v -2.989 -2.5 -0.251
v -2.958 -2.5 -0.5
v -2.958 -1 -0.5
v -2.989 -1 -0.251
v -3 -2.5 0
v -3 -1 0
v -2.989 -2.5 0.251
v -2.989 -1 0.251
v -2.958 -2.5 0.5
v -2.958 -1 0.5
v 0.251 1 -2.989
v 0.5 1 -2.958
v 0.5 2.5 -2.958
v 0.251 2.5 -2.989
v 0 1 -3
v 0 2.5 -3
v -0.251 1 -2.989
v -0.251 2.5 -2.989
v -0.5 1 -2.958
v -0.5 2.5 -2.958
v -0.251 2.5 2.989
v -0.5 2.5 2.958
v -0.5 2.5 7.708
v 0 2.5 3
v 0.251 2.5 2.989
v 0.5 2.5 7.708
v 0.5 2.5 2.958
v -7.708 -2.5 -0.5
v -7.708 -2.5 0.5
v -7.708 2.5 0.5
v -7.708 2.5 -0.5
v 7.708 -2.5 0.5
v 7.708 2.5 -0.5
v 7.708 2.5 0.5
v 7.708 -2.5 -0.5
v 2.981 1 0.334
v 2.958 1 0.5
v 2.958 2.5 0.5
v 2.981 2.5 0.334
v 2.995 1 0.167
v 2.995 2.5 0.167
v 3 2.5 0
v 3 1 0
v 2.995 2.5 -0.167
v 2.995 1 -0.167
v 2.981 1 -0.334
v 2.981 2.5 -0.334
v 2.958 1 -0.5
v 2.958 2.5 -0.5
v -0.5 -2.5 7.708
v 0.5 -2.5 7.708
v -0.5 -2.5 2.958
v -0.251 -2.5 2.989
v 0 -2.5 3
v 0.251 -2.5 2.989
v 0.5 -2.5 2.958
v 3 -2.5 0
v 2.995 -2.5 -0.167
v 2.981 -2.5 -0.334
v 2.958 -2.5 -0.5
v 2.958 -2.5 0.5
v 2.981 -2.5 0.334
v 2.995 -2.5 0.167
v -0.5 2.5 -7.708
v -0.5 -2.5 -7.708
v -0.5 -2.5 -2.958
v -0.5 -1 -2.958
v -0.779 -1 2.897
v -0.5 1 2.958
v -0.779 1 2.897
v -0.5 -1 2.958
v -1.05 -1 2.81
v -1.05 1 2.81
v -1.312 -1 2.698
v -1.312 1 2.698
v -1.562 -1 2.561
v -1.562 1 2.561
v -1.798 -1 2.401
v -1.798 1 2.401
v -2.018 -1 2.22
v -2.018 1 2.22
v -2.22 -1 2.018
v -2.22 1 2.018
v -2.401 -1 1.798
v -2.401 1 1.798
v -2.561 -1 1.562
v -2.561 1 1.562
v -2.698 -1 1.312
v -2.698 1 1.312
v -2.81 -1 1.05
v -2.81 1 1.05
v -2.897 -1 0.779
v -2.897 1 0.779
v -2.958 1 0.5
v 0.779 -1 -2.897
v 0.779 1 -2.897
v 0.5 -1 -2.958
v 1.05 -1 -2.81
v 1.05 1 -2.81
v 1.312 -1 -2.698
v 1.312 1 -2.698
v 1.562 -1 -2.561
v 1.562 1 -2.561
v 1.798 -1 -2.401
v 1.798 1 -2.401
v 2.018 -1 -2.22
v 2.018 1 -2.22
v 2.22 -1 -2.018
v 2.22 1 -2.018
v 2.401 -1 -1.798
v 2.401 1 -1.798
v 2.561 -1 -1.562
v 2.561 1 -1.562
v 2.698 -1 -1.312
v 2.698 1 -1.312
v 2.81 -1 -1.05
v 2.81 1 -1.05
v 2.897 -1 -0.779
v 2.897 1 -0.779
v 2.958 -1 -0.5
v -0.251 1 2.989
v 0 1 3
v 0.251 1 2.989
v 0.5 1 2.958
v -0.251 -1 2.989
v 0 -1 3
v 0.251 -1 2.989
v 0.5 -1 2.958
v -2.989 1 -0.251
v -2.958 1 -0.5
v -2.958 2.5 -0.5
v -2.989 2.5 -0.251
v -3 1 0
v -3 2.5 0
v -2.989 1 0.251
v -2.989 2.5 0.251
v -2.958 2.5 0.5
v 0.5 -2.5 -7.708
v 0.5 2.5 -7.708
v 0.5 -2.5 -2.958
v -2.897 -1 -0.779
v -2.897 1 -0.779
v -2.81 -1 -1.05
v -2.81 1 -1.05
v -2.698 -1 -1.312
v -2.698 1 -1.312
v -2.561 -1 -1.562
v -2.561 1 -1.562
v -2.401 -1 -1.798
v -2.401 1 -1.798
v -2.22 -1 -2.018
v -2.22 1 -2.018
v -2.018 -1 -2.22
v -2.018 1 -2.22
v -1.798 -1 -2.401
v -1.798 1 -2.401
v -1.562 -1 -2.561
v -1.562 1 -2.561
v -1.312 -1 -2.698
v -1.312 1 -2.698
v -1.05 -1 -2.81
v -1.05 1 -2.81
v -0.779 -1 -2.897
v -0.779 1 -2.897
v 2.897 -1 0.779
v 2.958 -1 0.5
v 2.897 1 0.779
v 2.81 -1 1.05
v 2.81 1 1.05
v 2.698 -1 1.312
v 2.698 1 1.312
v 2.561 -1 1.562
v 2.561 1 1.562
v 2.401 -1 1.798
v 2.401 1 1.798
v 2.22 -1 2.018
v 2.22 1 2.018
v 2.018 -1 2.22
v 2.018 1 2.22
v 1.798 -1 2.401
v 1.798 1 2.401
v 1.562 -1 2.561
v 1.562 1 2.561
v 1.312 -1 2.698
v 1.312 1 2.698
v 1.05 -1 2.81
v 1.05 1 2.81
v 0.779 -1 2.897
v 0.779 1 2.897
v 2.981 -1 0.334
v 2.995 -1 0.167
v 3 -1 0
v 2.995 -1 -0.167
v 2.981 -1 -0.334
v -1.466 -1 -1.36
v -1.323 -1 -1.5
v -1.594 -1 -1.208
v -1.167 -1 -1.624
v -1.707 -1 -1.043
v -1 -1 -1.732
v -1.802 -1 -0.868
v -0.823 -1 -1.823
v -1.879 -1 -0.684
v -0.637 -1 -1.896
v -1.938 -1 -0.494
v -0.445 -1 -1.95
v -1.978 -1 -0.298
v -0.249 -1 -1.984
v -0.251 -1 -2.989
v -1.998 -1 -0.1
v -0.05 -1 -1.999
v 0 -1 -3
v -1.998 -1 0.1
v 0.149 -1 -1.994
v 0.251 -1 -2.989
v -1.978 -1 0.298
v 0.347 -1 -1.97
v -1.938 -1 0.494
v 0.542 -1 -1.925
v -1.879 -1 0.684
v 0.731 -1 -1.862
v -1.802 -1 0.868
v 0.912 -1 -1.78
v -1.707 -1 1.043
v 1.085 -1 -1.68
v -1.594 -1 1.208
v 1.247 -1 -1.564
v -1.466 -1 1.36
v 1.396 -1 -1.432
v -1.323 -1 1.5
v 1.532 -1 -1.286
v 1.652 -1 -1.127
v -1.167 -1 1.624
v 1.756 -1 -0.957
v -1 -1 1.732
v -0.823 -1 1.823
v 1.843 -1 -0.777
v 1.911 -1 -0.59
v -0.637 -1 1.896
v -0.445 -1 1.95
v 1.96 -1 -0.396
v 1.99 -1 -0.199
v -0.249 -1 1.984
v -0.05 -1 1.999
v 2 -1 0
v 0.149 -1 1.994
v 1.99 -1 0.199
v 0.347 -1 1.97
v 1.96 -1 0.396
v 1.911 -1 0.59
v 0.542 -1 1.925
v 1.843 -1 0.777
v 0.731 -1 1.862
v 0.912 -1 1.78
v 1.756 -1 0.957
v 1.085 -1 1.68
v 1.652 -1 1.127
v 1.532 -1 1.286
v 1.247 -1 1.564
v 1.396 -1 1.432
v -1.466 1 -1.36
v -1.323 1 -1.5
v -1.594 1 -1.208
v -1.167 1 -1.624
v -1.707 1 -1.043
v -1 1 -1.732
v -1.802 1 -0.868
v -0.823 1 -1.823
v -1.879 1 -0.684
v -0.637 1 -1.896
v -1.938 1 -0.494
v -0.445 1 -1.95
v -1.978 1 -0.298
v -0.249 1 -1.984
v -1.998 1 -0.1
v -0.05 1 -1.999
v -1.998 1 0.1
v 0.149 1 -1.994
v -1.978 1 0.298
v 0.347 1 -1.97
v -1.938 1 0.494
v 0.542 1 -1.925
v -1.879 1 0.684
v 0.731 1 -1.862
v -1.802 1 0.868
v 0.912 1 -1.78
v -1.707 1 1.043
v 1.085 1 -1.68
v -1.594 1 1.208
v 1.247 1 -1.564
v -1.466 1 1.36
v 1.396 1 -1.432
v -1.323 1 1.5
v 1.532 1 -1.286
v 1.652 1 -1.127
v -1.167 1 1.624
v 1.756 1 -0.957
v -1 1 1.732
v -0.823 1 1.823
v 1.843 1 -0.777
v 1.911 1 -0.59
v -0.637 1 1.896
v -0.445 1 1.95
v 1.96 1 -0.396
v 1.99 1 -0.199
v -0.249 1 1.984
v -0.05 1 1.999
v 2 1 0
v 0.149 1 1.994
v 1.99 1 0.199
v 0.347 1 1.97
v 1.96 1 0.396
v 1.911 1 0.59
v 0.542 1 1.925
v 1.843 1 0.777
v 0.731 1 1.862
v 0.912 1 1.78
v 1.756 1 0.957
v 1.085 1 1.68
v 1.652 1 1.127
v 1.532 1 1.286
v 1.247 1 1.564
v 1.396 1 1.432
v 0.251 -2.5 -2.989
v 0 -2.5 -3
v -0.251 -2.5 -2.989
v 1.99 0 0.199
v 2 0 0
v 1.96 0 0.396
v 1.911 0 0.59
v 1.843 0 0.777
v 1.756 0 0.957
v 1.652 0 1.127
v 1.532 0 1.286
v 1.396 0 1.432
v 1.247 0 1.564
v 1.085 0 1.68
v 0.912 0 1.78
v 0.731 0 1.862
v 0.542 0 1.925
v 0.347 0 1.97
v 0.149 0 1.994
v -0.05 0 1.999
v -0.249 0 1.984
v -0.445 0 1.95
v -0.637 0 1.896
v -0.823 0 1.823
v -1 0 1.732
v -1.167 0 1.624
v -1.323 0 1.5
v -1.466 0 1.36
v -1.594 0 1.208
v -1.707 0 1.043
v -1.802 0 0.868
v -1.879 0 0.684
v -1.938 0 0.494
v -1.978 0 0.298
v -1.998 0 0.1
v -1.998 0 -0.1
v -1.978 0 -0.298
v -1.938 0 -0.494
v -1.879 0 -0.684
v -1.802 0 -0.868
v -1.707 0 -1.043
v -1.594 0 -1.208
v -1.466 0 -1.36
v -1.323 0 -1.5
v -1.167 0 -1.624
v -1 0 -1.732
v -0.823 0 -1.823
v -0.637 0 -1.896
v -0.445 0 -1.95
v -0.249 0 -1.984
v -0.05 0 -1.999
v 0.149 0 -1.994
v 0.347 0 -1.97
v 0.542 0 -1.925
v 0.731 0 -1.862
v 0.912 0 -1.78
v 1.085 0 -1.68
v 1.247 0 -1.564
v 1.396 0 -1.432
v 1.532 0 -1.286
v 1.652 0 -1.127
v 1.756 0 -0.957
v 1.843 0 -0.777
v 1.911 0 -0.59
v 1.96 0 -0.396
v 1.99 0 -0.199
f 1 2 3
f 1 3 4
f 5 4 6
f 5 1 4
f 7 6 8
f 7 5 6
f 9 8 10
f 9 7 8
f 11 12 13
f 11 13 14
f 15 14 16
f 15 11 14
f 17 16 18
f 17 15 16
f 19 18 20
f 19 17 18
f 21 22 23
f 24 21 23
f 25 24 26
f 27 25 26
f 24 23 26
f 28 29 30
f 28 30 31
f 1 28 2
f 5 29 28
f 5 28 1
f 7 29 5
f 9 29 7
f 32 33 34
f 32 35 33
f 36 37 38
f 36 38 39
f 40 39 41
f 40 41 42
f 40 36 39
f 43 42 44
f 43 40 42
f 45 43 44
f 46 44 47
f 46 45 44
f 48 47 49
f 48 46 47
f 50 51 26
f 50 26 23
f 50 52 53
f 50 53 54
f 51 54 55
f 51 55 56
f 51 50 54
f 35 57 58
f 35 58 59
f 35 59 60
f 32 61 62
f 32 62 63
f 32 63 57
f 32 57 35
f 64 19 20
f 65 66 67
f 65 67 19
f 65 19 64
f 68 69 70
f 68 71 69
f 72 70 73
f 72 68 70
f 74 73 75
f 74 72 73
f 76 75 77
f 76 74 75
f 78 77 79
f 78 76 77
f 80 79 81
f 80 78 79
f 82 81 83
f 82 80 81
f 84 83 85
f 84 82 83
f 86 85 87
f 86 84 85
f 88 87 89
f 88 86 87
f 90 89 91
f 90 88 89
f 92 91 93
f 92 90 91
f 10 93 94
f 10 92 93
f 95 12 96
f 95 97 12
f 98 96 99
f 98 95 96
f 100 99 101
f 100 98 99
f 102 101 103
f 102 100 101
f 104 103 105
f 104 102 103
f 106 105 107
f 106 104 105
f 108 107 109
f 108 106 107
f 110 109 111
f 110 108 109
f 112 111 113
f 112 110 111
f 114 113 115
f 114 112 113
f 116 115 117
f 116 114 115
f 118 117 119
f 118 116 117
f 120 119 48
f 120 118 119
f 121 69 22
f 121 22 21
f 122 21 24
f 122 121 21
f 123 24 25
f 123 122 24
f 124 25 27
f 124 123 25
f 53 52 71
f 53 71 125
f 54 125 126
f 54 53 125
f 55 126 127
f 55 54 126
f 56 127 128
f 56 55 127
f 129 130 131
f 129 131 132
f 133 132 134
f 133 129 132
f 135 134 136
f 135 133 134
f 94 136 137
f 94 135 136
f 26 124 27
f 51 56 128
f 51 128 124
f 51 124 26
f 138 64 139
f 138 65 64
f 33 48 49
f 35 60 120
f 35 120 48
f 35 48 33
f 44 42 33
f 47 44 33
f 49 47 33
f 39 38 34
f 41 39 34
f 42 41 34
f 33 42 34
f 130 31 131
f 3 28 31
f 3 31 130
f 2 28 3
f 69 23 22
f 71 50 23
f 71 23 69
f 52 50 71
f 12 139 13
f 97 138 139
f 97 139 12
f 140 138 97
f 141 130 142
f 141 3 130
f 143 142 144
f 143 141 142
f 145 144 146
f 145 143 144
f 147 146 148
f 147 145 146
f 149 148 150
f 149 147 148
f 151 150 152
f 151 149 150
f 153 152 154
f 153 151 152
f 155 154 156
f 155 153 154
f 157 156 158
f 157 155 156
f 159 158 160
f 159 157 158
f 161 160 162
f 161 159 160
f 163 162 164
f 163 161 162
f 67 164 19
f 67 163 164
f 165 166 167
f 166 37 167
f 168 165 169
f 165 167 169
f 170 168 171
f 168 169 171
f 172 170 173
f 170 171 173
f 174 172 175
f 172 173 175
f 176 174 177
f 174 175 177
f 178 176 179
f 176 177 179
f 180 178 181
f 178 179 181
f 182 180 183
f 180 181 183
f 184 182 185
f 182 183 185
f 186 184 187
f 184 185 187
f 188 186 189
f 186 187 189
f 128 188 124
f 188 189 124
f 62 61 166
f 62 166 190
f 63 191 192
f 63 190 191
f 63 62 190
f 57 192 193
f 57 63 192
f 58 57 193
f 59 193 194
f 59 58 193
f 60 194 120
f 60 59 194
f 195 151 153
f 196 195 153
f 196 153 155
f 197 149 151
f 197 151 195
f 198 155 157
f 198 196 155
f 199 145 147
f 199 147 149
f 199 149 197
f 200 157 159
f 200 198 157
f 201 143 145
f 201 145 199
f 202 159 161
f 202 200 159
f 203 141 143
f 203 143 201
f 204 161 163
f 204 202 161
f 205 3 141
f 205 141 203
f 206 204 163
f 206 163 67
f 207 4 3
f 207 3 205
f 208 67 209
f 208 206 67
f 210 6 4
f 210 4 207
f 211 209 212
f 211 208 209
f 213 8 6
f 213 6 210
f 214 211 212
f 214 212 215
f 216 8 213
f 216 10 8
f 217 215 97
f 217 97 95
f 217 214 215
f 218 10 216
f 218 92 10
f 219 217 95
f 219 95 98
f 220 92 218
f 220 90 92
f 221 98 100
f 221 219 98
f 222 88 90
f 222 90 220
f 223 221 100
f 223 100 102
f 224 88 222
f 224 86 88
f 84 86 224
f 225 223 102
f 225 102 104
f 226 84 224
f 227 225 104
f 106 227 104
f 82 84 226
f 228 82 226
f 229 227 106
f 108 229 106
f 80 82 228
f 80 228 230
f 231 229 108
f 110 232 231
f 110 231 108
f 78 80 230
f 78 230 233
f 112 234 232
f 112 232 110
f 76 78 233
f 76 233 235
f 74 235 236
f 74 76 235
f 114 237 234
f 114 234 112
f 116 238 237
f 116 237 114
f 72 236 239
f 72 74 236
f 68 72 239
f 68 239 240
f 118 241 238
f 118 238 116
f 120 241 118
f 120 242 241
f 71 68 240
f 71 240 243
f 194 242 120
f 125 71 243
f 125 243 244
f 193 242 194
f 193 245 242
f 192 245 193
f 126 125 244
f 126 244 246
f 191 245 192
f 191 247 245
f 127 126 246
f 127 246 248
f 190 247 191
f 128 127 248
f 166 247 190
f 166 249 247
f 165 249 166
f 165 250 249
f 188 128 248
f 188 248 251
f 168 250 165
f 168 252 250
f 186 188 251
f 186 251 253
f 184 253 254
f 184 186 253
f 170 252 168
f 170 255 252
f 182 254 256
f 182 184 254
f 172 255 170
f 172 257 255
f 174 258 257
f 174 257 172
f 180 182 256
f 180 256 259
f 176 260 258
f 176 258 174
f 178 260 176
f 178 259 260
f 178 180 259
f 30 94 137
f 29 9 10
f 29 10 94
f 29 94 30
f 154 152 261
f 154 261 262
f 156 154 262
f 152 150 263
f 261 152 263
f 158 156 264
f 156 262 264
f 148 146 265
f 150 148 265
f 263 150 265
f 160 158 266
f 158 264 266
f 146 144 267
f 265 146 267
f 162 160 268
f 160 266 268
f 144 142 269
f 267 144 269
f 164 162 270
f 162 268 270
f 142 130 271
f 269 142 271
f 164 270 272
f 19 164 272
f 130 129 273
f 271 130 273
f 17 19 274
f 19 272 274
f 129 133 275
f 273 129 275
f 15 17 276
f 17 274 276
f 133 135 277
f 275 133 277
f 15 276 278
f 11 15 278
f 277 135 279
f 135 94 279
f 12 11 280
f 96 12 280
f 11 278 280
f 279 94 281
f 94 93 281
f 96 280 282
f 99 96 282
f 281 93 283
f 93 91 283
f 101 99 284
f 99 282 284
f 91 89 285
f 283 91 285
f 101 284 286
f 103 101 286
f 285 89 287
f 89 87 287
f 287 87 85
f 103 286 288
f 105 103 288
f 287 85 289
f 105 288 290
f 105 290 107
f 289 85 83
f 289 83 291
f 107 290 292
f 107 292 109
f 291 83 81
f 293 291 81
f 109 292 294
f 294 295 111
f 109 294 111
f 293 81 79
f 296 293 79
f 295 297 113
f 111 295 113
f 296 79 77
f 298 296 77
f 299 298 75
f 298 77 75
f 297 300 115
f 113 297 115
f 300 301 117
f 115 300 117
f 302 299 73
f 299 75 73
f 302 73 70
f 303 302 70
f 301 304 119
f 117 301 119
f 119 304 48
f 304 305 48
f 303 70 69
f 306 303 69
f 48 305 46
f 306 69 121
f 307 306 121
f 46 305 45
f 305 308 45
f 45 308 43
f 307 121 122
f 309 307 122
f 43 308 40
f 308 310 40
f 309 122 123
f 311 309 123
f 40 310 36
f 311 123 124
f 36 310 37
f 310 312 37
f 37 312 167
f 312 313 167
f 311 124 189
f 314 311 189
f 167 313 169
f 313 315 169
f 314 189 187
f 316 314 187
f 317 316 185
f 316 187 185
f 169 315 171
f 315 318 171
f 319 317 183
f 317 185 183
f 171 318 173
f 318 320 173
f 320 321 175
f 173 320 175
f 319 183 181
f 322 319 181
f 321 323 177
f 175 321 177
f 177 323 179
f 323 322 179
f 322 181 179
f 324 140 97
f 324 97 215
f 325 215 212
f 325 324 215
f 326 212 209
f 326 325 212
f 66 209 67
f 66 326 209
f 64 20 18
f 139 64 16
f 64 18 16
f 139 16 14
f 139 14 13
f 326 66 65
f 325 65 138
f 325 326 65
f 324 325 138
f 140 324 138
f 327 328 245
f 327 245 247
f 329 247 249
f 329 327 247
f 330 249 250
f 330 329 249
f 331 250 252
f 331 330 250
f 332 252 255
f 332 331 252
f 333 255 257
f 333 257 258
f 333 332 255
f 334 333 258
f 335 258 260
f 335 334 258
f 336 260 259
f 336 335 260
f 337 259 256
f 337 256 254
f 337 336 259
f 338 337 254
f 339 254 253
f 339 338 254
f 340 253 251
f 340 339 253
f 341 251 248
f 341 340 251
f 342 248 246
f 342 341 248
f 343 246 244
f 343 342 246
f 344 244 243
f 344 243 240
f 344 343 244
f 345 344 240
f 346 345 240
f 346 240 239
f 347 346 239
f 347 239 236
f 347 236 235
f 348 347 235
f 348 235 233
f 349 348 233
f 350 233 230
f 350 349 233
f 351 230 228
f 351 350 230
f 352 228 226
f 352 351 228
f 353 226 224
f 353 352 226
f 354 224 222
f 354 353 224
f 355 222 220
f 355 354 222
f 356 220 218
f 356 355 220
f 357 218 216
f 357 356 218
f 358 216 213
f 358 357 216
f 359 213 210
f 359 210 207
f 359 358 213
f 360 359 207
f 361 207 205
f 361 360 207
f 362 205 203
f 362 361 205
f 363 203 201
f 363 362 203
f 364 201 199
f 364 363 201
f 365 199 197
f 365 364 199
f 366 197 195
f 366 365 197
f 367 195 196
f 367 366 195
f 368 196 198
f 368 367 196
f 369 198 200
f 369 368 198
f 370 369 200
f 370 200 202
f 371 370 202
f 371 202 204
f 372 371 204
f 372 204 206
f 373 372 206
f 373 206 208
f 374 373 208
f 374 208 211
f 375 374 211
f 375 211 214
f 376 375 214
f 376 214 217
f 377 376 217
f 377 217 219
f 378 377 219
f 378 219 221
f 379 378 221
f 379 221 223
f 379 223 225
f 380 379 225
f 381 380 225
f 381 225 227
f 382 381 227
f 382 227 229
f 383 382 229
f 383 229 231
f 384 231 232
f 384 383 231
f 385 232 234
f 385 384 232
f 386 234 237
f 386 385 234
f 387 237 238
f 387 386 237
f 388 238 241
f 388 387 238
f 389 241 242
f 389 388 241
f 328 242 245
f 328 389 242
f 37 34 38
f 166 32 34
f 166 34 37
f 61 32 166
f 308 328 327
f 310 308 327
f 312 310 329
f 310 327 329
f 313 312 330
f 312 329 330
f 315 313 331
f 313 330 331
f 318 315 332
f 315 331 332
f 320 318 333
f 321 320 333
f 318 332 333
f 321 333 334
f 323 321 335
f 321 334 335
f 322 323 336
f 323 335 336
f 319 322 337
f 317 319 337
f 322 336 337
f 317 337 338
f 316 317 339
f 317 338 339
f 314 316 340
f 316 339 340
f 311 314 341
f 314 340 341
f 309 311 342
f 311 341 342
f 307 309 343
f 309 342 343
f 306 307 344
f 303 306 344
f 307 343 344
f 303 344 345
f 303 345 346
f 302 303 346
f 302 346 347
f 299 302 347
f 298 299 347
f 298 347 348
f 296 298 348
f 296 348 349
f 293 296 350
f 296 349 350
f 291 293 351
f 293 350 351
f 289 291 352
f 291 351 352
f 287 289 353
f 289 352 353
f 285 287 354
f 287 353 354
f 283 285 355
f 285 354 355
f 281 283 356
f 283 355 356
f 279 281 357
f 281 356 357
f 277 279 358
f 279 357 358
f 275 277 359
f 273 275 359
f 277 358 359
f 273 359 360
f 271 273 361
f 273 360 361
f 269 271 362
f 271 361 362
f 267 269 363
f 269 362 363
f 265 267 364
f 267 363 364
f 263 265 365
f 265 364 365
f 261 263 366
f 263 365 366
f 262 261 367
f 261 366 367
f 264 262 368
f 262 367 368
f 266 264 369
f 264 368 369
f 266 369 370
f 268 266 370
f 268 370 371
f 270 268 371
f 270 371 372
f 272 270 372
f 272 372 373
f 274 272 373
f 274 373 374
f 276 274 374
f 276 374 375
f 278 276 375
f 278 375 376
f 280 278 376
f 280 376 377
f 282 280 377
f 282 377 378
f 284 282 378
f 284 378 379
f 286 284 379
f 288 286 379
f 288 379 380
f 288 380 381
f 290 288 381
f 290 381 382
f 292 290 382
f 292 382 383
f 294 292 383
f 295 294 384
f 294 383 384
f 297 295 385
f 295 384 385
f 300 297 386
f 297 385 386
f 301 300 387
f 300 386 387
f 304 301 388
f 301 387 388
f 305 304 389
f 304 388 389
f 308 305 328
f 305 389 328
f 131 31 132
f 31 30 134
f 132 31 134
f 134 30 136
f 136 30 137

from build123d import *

# Parameters (mm, degrees)
F1_DEPTH = 2.5
F0_R     = 2
F2_DEPTH = 1


with BuildPart() as f1:
    # F0 (on Front) → F1 (new body, symmetric)
    with BuildSketch(Plane.XZ):
        with BuildLine():
            ThreePointArc((-0.5, 2.9580398915), (0, 3), (0.5, 2.9580398915))
            Line((0.5, 2.9580398915), (0.5, 7.7080398915))
            Line((0.5, 7.7080398915), (-0.5, 7.7080398915))
            Line((-0.5, 7.7080398915), (-0.5, 2.9580398915))
        make_face()
    extrude(amount=F1_DEPTH, both=True)



with BuildPart() as f1b:
    # F0 (on Front) → F1, piece 2 (new body, symmetric)
    with BuildSketch(Plane.XZ):
        with BuildLine():
            ThreePointArc((-2.9580398915, -0.5), (-3, 0), (-2.9580398915, 0.5))
            Line((-2.9580398915, 0.5), (-7.7080398915, 0.5))
            Line((-7.7080398915, 0.5), (-7.7080398915, -0.5))
            Line((-7.7080398915, -0.5), (-2.9580398915, -0.5))
        make_face()
    extrude(amount=F1_DEPTH, both=True)


with BuildPart() as f1c:
    # F0 (on Front) → F1, piece 3 (new body, symmetric)
    with BuildSketch(Plane.XZ):
        with BuildLine():
            Line((0.5, -7.7080398915), (0.5, -2.9580398915))
            ThreePointArc((0.5, -2.9580398915), (0, -3), (-0.5, -2.9580398915))
            Line((-0.5, -2.9580398915), (-0.5, -7.7080398915))
            Line((-0.5, -7.7080398915), (0.5, -7.7080398915))
        make_face()
    extrude(amount=F1_DEPTH, both=True)


with BuildPart() as f1d:
    # F0 (on Front) → F1, piece 4 (new body, symmetric)
    with BuildSketch(Plane.XZ):
        with BuildLine():
            ThreePointArc((2.9580398915, 0.5), (2.9894915684, 0.2508787808), (3, 0))
            ThreePointArc((3, 0), (2.9894915684, -0.2508787808), (2.9580398915, -0.5))
            Line((2.9580398915, -0.5), (7.7080398915, -0.5))
            Line((7.7080398915, -0.5), (7.7080398915, 0.5))
            Line((7.7080398915, 0.5), (2.9580398915, 0.5))
        make_face()
    extrude(amount=F1_DEPTH, both=True)


with BuildPart() as f1_1:
    add(f1.part)

    add(f1b.part)  # F2 merges F1b

    add(f1c.part)  # F2 merges F1c

    add(f1d.part)  # F2 merges F1d
    # F0 (on Front) → F2 (join, symmetric)
    with BuildSketch(Plane.XZ):
        with BuildLine():
            ThreePointArc((2.9580398915, -0.5), (2.9894915684, -0.2508787808), (3, 0))
            ThreePointArc((3, 0), (2.9894915684, 0.2508787808), (2.9580398915, 0.5))
            ThreePointArc((2.9580398915, 0.5), (2.1213203436, 2.1213203436), (0.5, 2.9580398915))
            ThreePointArc((0.5, 2.9580398915), (0, 3), (-0.5, 2.9580398915))
            ThreePointArc((-0.5, 2.9580398915), (-2.1213203436, 2.1213203436), (-2.9580398915, 0.5))
            ThreePointArc((-2.9580398915, 0.5), (-3, 0), (-2.9580398915, -0.5))
            ThreePointArc((-2.9580398915, -0.5), (-2.1213203436, -2.1213203436), (-0.5, -2.9580398915))
            ThreePointArc((-0.5, -2.9580398915), (0, -3), (0.5, -2.9580398915))
            ThreePointArc((0.5, -2.9580398915), (2.1213203436, -2.1213203436), (2.9580398915, -0.5))
        make_face()
        Circle(F0_R, mode=Mode.SUBTRACT)
    extrude(amount=F2_DEPTH, both=True)


solid = f1_1.part
